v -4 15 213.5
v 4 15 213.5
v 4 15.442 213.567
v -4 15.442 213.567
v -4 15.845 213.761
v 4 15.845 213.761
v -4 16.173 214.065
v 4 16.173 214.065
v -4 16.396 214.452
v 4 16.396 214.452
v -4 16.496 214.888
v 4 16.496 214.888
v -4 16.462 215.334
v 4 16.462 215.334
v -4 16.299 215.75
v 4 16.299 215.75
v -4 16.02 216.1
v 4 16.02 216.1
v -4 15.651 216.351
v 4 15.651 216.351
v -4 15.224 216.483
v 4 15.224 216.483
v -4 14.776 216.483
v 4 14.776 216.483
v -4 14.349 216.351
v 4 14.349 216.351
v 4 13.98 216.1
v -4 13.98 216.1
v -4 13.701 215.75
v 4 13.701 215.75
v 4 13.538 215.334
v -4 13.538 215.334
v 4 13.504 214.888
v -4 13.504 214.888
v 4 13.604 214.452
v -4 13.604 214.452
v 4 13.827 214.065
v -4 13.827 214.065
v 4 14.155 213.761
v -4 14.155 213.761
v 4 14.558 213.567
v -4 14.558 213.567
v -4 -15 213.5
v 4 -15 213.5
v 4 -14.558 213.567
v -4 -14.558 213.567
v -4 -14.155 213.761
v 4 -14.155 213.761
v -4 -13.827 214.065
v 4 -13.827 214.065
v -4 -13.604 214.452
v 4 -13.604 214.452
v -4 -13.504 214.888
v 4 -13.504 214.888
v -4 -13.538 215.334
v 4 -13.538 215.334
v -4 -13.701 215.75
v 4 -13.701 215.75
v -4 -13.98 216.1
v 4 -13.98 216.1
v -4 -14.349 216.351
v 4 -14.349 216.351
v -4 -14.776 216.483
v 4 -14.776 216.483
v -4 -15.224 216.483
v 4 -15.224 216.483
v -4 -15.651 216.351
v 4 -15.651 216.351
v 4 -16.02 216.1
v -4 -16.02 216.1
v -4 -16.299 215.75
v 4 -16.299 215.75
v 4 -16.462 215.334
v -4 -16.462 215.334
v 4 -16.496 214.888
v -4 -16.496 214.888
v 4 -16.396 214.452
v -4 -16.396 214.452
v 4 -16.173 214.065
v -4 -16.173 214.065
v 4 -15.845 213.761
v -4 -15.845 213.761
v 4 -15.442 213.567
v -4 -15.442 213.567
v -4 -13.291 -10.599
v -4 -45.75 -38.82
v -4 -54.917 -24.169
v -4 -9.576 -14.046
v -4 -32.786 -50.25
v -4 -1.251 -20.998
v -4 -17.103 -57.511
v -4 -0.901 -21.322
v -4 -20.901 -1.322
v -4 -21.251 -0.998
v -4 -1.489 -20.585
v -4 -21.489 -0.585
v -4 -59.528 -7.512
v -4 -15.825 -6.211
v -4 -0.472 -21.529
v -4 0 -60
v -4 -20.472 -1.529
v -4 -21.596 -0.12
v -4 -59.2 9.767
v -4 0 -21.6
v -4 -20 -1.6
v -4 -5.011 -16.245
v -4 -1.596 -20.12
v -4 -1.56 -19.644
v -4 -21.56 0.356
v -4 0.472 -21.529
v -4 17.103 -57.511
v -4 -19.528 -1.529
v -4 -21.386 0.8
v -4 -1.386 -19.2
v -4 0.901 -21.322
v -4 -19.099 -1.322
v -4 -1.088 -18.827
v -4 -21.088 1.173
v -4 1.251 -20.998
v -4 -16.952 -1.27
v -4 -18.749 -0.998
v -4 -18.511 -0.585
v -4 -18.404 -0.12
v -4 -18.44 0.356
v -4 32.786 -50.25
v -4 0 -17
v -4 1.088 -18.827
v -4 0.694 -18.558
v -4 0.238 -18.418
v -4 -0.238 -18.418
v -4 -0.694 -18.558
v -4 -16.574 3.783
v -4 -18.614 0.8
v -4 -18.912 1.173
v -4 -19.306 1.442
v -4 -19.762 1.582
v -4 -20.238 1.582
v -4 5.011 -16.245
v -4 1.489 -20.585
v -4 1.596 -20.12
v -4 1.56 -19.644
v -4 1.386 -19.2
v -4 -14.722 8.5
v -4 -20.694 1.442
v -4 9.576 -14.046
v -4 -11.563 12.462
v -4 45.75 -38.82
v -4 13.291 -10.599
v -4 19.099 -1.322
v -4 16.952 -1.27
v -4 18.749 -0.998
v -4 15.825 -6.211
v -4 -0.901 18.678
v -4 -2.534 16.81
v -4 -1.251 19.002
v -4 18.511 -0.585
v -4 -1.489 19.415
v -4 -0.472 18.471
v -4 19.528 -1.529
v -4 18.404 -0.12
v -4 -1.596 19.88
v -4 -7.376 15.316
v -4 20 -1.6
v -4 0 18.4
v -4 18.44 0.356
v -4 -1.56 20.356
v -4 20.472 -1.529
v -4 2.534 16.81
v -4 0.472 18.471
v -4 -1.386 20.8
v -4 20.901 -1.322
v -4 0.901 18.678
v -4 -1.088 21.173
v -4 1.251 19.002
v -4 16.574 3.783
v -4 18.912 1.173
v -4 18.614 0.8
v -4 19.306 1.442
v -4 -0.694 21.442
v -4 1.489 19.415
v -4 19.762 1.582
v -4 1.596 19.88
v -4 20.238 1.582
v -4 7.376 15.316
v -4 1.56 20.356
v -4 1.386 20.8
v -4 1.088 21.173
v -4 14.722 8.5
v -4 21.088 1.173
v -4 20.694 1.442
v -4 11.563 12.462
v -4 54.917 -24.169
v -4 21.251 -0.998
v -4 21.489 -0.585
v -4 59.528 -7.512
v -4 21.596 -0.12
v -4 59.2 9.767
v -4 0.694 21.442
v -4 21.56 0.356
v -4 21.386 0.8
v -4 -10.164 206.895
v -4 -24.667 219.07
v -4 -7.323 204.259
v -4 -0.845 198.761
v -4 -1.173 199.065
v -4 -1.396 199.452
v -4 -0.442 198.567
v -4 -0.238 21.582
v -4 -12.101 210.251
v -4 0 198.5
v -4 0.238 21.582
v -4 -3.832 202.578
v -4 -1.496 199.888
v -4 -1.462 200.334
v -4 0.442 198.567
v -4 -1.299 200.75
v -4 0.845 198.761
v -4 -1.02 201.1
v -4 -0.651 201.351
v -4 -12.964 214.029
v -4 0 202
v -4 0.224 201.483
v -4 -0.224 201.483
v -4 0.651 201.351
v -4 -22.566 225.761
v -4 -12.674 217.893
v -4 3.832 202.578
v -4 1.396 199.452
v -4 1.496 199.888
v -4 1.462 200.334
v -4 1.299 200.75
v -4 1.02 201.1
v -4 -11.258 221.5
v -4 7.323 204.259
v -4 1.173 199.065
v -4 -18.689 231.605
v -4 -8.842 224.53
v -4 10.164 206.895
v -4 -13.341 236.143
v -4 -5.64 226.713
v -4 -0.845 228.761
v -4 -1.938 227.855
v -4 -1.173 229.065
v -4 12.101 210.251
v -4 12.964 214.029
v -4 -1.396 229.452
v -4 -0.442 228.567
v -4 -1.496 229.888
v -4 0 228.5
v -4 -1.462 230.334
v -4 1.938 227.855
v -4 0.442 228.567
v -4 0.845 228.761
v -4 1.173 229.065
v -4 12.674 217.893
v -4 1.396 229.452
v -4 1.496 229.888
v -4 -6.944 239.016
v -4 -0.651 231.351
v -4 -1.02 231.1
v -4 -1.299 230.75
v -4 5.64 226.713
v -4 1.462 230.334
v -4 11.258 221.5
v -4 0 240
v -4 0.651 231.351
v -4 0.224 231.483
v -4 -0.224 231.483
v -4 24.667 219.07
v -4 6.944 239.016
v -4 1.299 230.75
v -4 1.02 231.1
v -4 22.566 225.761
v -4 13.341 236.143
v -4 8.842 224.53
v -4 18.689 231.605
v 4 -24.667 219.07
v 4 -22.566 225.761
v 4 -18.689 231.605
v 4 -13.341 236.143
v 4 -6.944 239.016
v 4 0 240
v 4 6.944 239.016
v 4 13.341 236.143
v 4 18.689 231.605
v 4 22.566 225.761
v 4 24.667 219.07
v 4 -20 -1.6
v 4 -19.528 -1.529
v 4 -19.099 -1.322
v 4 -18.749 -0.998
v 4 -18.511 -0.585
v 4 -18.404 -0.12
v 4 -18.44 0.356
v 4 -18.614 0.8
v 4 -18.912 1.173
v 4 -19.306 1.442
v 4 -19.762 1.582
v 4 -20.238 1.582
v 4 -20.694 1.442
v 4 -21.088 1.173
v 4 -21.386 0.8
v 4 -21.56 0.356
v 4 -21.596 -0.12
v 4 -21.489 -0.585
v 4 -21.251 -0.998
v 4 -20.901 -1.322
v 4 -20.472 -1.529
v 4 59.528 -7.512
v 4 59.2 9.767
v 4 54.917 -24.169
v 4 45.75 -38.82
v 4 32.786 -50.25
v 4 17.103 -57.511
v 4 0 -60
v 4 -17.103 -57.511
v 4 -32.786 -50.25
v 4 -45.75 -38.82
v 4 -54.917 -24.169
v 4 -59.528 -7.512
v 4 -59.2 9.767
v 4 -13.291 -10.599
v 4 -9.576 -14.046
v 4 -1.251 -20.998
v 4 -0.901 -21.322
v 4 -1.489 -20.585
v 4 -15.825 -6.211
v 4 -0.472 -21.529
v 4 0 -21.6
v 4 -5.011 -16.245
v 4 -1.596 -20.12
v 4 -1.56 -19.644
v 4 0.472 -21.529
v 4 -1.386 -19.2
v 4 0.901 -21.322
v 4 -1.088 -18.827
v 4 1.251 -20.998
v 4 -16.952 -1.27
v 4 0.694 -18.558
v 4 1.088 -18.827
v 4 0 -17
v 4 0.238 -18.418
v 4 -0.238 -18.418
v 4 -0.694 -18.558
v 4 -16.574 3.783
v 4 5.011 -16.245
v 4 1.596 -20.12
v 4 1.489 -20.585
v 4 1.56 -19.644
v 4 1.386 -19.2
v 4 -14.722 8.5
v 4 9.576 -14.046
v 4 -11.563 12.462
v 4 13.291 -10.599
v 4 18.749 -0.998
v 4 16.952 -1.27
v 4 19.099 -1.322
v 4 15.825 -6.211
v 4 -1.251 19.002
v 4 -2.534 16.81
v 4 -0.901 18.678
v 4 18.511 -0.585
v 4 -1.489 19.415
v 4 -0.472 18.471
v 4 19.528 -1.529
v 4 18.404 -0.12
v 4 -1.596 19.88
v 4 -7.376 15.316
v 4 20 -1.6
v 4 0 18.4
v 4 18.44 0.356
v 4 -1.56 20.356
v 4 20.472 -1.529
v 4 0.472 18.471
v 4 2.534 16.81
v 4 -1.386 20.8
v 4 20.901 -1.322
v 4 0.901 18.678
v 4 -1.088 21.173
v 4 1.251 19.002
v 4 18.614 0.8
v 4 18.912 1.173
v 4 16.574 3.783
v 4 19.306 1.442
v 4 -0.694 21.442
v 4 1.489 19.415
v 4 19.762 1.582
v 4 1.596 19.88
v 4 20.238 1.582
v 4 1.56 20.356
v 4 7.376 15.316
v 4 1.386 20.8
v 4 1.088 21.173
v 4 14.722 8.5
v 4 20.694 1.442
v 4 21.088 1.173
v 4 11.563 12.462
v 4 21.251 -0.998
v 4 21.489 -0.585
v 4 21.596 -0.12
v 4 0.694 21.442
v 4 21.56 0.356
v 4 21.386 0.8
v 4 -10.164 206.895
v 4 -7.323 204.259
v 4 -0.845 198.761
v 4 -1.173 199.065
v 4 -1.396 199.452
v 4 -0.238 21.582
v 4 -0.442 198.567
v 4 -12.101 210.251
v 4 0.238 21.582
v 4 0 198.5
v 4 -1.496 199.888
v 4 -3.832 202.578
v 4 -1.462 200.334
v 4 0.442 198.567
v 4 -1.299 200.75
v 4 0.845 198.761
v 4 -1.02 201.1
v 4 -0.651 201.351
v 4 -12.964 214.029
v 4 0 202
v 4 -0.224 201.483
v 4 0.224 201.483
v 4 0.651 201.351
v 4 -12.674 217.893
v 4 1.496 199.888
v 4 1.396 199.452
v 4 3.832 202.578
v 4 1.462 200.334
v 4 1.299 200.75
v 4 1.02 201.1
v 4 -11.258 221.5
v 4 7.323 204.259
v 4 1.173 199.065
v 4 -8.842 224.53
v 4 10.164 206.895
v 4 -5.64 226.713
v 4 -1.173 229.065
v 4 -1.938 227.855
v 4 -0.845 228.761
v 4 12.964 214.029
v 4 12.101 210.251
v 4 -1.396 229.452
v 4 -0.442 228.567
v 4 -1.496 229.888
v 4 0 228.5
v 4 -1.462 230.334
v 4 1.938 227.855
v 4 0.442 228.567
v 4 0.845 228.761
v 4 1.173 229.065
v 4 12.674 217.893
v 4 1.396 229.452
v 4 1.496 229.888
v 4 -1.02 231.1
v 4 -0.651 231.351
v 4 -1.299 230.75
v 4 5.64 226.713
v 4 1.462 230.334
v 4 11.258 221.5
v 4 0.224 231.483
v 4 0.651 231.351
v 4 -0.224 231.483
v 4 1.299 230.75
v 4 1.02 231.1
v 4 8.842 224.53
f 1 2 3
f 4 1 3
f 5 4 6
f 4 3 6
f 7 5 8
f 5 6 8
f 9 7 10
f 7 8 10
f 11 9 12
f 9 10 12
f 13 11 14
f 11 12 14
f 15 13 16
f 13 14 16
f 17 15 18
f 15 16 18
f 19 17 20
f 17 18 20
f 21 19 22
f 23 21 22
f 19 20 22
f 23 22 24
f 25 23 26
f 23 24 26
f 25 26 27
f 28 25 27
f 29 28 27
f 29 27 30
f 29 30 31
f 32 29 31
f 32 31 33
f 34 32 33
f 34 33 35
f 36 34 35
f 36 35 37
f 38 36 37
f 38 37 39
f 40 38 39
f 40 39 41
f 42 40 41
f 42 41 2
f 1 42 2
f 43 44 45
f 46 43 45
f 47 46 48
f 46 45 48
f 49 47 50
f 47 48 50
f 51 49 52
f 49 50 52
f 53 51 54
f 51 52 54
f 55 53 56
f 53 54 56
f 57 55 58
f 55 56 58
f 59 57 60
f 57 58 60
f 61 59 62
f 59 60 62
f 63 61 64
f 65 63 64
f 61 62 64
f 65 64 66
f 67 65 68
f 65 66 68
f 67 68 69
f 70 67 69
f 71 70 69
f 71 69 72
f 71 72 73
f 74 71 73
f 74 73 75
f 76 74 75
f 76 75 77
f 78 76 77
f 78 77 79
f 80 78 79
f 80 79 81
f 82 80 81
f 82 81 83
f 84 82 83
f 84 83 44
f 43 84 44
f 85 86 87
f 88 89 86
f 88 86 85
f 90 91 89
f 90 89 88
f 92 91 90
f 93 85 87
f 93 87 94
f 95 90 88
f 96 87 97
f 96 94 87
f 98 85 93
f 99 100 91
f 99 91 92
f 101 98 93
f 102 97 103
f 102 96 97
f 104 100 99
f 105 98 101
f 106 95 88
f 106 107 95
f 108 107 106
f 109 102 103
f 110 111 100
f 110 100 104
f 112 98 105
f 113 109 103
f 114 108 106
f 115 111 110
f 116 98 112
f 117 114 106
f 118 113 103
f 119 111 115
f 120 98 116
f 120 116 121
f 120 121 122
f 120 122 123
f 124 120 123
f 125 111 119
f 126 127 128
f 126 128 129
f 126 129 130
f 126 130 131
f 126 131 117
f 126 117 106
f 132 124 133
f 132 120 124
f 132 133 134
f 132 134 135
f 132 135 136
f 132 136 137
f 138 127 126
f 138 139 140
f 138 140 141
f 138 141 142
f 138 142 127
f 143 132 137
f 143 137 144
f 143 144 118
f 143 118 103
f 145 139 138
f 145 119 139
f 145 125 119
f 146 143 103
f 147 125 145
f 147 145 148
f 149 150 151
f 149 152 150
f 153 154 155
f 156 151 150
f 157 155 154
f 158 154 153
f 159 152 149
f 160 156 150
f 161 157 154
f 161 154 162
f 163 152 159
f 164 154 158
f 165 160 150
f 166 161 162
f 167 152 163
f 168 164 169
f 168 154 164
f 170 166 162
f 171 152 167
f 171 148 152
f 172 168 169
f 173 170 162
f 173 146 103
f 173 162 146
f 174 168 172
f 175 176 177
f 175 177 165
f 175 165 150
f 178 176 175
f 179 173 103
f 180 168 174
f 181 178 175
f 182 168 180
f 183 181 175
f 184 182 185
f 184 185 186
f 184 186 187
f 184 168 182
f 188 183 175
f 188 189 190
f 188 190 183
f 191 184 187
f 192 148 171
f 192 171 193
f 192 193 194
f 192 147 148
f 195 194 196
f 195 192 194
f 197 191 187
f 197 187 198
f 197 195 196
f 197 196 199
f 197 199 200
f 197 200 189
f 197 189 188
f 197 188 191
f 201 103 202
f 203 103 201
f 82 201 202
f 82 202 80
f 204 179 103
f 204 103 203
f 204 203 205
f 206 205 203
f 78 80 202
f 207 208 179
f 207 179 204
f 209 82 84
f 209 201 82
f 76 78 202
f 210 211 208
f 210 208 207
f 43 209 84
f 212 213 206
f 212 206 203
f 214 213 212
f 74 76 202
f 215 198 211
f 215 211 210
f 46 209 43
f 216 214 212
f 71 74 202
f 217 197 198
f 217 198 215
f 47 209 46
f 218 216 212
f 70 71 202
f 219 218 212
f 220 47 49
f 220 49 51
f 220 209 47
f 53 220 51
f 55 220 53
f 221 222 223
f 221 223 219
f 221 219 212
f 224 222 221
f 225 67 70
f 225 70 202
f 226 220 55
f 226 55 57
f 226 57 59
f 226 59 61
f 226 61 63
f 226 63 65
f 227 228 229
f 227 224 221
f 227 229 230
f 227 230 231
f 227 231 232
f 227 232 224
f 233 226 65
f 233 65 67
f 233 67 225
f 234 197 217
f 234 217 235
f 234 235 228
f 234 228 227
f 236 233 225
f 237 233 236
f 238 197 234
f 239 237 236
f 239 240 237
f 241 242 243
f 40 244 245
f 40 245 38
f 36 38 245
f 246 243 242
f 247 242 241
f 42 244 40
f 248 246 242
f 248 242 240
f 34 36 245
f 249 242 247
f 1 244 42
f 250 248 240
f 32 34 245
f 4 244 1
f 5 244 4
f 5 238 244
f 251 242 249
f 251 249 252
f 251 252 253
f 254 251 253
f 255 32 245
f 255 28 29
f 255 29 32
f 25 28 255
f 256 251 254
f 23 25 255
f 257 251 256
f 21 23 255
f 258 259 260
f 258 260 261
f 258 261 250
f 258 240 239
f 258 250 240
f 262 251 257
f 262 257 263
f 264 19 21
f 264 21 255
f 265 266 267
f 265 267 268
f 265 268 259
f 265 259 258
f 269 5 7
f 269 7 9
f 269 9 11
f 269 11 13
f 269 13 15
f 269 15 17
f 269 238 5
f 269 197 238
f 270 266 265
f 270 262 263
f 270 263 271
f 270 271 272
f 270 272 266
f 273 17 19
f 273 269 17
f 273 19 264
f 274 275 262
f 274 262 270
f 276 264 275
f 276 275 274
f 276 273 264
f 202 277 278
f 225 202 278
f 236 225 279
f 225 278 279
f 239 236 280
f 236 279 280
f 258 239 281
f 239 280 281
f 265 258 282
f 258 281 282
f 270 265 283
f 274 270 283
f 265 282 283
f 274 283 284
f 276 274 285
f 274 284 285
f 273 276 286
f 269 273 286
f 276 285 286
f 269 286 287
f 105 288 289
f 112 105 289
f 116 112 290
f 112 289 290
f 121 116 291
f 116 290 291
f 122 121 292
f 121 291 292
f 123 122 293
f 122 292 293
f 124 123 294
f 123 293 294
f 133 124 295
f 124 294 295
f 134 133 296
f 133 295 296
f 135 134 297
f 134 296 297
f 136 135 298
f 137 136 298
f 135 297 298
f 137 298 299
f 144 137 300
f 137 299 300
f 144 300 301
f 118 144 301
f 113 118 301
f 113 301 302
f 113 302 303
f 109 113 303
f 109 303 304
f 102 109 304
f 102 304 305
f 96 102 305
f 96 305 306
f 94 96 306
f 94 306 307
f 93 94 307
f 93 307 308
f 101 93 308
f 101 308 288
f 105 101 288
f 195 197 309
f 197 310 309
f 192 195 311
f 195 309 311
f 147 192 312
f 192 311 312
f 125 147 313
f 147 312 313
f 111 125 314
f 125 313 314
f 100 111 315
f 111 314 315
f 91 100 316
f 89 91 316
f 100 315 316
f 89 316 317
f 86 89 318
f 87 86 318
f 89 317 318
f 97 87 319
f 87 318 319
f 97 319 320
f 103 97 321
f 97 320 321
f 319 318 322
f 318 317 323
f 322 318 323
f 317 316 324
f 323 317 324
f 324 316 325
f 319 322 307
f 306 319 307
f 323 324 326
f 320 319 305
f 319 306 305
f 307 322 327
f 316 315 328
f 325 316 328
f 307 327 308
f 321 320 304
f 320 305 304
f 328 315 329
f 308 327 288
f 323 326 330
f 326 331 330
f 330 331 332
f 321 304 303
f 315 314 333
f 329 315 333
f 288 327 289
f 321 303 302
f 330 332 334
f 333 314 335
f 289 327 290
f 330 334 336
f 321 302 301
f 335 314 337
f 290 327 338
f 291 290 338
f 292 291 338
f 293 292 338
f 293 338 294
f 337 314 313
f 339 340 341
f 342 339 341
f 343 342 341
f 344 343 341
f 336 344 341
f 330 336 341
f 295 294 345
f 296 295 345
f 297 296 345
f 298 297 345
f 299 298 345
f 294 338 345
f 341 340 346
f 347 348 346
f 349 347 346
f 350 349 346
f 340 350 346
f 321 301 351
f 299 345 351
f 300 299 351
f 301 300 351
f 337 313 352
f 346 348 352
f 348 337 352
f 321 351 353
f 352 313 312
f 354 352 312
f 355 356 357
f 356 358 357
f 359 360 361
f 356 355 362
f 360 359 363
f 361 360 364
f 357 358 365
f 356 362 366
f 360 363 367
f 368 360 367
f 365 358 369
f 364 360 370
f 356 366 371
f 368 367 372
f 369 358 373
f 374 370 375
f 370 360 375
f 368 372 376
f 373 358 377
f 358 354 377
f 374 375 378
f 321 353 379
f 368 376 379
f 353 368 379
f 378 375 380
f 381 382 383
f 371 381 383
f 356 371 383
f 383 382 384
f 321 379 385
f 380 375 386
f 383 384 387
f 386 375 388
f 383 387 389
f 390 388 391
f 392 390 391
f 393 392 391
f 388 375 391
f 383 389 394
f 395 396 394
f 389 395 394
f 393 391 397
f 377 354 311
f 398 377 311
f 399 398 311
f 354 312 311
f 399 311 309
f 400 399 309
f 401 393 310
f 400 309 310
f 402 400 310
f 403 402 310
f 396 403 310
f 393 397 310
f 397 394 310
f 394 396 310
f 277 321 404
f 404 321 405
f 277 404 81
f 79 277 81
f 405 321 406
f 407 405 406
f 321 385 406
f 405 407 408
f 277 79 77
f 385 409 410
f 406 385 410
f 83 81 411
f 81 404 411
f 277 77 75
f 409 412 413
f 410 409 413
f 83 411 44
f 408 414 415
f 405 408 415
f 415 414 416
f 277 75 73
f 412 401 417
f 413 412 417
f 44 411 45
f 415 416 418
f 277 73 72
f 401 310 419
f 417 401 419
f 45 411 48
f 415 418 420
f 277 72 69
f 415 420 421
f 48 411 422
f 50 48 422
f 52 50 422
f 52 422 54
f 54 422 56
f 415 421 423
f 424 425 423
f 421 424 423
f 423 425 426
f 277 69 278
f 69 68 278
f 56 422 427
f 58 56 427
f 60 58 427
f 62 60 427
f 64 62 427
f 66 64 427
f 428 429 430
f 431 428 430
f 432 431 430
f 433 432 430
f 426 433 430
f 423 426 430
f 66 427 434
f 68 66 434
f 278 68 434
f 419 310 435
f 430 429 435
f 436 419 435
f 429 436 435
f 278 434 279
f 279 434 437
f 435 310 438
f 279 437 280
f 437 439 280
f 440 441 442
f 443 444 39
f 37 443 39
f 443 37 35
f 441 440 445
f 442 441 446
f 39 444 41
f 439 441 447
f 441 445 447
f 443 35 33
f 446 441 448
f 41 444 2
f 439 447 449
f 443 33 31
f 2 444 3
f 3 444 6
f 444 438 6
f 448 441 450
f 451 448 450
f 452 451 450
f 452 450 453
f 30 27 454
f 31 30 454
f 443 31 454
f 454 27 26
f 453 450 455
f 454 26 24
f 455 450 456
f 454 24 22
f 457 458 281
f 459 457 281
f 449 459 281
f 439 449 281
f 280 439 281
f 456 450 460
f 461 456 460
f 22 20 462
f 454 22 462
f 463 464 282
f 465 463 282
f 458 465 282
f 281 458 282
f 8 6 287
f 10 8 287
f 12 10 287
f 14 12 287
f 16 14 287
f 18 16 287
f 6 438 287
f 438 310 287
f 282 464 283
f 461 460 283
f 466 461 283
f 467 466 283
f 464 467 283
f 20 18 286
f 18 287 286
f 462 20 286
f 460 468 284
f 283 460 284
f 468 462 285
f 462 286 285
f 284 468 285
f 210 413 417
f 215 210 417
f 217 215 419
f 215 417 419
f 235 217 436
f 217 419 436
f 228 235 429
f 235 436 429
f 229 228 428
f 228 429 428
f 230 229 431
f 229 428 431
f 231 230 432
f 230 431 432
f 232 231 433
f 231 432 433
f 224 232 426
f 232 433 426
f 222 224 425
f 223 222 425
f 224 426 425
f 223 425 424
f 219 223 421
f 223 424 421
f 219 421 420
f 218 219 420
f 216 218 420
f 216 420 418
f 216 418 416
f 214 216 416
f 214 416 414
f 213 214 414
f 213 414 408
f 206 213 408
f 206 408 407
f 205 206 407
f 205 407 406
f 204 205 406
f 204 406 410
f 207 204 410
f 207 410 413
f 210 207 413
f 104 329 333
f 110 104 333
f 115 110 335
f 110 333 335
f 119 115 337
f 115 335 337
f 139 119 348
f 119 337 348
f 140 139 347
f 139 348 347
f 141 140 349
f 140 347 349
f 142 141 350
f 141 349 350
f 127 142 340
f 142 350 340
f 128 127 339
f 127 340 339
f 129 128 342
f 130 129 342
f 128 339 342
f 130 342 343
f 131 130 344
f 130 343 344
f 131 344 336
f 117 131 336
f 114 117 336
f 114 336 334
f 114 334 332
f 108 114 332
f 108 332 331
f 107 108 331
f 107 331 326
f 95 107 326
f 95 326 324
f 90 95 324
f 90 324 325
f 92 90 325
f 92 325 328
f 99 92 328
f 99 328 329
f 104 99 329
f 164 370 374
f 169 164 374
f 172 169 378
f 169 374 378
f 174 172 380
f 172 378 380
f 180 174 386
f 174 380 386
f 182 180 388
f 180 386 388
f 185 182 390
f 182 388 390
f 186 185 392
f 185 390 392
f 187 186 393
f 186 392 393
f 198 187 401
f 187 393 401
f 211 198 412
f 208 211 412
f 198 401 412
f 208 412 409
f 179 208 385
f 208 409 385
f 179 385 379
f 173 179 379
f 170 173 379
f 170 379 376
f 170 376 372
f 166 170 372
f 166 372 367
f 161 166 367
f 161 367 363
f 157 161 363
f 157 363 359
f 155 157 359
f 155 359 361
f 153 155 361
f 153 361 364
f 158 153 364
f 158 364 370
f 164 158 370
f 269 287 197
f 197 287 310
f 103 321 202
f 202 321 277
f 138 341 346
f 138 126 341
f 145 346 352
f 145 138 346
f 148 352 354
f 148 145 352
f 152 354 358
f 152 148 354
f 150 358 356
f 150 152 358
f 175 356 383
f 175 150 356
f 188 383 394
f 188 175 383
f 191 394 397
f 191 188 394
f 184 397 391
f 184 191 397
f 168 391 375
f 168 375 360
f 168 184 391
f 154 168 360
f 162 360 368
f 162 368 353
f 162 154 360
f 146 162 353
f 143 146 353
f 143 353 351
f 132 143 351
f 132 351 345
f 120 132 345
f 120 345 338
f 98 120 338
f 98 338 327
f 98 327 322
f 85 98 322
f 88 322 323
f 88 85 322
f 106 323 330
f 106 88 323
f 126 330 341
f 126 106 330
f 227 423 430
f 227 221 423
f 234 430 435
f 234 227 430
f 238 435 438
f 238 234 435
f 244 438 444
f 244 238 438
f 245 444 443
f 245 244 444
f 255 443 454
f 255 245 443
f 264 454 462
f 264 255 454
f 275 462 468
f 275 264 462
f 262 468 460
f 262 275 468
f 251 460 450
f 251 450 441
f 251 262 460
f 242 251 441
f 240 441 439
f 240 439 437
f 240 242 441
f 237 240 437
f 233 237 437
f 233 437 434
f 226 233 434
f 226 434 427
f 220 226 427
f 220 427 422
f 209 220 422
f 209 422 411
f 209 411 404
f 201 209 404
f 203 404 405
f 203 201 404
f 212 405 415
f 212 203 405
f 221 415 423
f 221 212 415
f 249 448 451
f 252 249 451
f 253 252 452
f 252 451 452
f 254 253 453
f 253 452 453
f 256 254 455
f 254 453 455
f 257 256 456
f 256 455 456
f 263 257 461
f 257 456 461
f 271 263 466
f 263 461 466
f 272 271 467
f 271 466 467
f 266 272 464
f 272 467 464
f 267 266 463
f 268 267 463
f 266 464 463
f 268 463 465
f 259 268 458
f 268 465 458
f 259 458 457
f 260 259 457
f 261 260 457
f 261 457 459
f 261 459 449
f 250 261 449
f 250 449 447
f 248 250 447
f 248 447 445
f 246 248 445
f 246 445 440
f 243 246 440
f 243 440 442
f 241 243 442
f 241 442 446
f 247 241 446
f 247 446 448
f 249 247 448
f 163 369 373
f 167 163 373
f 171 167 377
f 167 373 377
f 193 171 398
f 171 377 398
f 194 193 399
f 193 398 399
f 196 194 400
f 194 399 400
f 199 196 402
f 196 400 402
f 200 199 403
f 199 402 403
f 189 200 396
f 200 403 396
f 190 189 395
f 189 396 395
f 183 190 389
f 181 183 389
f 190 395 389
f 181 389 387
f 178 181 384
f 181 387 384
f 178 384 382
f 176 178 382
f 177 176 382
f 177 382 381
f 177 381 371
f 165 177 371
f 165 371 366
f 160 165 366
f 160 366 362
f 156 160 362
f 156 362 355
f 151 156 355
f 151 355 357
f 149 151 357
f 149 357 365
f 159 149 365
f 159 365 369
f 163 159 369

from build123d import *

# Parameters (mm, degrees)
SKETCH1_R           = 17
SKETCH1_R_2         = 13
BOSS_EXTRUDE1_DEPTH = 4
SKETCH2_R           = 1.6
SKETCH2_R_2         = 1.5
CUT_EXTRUDE1_DEPTH  = 248.51565607


with BuildPart() as part:
    # Sketch1 → Boss-Extrude1 (new, symmetric)
    with BuildSketch(Plane(origin=(0, 0, 0), x_dir=(0, 0, -1), z_dir=(1, 0, 0))):
        with BuildLine():
            Line((-219.069767442, 24.666515623), (-9.76744186, 59.199637495))
            ThreePointArc((-9.76744186, 59.199637495), (60, 0), (-9.76744186, -59.199637495))
            Line((-9.76744186, -59.199637495), (-219.069767442, -24.666515623))
            ThreePointArc((-219.069767442, -24.666515623), (-240, 0), (-219.069767442, 24.666515623))
        make_face()
        Circle(SKETCH1_R, mode=Mode.SUBTRACT)
        with Locations((-215, 0)):
            Circle(SKETCH1_R_2, mode=Mode.SUBTRACT)
    extrude(amount=BOSS_EXTRUDE1_DEPTH, both=True)

    # Sketch2 → Cut-Extrude1 (cut, through all)
    with BuildSketch(Plane(origin=(4, 0, 0), x_dir=(0, 0, -1), z_dir=(1, 0, 0))):
        with Locations((0, 20)):
            Circle(SKETCH2_R)
        with Locations((20, 0)):
            Circle(SKETCH2_R)
        with Locations((0, -20)):
            Circle(SKETCH2_R)
        with Locations((-20, 0)):
            Circle(SKETCH2_R)
        with Locations((-215, 15)):
            Circle(SKETCH2_R_2)
        with Locations((-200, 0)):
            Circle(SKETCH2_R_2)
        with Locations((-215, -15)):
            Circle(SKETCH2_R_2)
        with Locations((-230, 0)):
            Circle(SKETCH2_R_2)
    extrude(amount=-CUT_EXTRUDE1_DEPTH, mode=Mode.SUBTRACT)


solid = part.part
